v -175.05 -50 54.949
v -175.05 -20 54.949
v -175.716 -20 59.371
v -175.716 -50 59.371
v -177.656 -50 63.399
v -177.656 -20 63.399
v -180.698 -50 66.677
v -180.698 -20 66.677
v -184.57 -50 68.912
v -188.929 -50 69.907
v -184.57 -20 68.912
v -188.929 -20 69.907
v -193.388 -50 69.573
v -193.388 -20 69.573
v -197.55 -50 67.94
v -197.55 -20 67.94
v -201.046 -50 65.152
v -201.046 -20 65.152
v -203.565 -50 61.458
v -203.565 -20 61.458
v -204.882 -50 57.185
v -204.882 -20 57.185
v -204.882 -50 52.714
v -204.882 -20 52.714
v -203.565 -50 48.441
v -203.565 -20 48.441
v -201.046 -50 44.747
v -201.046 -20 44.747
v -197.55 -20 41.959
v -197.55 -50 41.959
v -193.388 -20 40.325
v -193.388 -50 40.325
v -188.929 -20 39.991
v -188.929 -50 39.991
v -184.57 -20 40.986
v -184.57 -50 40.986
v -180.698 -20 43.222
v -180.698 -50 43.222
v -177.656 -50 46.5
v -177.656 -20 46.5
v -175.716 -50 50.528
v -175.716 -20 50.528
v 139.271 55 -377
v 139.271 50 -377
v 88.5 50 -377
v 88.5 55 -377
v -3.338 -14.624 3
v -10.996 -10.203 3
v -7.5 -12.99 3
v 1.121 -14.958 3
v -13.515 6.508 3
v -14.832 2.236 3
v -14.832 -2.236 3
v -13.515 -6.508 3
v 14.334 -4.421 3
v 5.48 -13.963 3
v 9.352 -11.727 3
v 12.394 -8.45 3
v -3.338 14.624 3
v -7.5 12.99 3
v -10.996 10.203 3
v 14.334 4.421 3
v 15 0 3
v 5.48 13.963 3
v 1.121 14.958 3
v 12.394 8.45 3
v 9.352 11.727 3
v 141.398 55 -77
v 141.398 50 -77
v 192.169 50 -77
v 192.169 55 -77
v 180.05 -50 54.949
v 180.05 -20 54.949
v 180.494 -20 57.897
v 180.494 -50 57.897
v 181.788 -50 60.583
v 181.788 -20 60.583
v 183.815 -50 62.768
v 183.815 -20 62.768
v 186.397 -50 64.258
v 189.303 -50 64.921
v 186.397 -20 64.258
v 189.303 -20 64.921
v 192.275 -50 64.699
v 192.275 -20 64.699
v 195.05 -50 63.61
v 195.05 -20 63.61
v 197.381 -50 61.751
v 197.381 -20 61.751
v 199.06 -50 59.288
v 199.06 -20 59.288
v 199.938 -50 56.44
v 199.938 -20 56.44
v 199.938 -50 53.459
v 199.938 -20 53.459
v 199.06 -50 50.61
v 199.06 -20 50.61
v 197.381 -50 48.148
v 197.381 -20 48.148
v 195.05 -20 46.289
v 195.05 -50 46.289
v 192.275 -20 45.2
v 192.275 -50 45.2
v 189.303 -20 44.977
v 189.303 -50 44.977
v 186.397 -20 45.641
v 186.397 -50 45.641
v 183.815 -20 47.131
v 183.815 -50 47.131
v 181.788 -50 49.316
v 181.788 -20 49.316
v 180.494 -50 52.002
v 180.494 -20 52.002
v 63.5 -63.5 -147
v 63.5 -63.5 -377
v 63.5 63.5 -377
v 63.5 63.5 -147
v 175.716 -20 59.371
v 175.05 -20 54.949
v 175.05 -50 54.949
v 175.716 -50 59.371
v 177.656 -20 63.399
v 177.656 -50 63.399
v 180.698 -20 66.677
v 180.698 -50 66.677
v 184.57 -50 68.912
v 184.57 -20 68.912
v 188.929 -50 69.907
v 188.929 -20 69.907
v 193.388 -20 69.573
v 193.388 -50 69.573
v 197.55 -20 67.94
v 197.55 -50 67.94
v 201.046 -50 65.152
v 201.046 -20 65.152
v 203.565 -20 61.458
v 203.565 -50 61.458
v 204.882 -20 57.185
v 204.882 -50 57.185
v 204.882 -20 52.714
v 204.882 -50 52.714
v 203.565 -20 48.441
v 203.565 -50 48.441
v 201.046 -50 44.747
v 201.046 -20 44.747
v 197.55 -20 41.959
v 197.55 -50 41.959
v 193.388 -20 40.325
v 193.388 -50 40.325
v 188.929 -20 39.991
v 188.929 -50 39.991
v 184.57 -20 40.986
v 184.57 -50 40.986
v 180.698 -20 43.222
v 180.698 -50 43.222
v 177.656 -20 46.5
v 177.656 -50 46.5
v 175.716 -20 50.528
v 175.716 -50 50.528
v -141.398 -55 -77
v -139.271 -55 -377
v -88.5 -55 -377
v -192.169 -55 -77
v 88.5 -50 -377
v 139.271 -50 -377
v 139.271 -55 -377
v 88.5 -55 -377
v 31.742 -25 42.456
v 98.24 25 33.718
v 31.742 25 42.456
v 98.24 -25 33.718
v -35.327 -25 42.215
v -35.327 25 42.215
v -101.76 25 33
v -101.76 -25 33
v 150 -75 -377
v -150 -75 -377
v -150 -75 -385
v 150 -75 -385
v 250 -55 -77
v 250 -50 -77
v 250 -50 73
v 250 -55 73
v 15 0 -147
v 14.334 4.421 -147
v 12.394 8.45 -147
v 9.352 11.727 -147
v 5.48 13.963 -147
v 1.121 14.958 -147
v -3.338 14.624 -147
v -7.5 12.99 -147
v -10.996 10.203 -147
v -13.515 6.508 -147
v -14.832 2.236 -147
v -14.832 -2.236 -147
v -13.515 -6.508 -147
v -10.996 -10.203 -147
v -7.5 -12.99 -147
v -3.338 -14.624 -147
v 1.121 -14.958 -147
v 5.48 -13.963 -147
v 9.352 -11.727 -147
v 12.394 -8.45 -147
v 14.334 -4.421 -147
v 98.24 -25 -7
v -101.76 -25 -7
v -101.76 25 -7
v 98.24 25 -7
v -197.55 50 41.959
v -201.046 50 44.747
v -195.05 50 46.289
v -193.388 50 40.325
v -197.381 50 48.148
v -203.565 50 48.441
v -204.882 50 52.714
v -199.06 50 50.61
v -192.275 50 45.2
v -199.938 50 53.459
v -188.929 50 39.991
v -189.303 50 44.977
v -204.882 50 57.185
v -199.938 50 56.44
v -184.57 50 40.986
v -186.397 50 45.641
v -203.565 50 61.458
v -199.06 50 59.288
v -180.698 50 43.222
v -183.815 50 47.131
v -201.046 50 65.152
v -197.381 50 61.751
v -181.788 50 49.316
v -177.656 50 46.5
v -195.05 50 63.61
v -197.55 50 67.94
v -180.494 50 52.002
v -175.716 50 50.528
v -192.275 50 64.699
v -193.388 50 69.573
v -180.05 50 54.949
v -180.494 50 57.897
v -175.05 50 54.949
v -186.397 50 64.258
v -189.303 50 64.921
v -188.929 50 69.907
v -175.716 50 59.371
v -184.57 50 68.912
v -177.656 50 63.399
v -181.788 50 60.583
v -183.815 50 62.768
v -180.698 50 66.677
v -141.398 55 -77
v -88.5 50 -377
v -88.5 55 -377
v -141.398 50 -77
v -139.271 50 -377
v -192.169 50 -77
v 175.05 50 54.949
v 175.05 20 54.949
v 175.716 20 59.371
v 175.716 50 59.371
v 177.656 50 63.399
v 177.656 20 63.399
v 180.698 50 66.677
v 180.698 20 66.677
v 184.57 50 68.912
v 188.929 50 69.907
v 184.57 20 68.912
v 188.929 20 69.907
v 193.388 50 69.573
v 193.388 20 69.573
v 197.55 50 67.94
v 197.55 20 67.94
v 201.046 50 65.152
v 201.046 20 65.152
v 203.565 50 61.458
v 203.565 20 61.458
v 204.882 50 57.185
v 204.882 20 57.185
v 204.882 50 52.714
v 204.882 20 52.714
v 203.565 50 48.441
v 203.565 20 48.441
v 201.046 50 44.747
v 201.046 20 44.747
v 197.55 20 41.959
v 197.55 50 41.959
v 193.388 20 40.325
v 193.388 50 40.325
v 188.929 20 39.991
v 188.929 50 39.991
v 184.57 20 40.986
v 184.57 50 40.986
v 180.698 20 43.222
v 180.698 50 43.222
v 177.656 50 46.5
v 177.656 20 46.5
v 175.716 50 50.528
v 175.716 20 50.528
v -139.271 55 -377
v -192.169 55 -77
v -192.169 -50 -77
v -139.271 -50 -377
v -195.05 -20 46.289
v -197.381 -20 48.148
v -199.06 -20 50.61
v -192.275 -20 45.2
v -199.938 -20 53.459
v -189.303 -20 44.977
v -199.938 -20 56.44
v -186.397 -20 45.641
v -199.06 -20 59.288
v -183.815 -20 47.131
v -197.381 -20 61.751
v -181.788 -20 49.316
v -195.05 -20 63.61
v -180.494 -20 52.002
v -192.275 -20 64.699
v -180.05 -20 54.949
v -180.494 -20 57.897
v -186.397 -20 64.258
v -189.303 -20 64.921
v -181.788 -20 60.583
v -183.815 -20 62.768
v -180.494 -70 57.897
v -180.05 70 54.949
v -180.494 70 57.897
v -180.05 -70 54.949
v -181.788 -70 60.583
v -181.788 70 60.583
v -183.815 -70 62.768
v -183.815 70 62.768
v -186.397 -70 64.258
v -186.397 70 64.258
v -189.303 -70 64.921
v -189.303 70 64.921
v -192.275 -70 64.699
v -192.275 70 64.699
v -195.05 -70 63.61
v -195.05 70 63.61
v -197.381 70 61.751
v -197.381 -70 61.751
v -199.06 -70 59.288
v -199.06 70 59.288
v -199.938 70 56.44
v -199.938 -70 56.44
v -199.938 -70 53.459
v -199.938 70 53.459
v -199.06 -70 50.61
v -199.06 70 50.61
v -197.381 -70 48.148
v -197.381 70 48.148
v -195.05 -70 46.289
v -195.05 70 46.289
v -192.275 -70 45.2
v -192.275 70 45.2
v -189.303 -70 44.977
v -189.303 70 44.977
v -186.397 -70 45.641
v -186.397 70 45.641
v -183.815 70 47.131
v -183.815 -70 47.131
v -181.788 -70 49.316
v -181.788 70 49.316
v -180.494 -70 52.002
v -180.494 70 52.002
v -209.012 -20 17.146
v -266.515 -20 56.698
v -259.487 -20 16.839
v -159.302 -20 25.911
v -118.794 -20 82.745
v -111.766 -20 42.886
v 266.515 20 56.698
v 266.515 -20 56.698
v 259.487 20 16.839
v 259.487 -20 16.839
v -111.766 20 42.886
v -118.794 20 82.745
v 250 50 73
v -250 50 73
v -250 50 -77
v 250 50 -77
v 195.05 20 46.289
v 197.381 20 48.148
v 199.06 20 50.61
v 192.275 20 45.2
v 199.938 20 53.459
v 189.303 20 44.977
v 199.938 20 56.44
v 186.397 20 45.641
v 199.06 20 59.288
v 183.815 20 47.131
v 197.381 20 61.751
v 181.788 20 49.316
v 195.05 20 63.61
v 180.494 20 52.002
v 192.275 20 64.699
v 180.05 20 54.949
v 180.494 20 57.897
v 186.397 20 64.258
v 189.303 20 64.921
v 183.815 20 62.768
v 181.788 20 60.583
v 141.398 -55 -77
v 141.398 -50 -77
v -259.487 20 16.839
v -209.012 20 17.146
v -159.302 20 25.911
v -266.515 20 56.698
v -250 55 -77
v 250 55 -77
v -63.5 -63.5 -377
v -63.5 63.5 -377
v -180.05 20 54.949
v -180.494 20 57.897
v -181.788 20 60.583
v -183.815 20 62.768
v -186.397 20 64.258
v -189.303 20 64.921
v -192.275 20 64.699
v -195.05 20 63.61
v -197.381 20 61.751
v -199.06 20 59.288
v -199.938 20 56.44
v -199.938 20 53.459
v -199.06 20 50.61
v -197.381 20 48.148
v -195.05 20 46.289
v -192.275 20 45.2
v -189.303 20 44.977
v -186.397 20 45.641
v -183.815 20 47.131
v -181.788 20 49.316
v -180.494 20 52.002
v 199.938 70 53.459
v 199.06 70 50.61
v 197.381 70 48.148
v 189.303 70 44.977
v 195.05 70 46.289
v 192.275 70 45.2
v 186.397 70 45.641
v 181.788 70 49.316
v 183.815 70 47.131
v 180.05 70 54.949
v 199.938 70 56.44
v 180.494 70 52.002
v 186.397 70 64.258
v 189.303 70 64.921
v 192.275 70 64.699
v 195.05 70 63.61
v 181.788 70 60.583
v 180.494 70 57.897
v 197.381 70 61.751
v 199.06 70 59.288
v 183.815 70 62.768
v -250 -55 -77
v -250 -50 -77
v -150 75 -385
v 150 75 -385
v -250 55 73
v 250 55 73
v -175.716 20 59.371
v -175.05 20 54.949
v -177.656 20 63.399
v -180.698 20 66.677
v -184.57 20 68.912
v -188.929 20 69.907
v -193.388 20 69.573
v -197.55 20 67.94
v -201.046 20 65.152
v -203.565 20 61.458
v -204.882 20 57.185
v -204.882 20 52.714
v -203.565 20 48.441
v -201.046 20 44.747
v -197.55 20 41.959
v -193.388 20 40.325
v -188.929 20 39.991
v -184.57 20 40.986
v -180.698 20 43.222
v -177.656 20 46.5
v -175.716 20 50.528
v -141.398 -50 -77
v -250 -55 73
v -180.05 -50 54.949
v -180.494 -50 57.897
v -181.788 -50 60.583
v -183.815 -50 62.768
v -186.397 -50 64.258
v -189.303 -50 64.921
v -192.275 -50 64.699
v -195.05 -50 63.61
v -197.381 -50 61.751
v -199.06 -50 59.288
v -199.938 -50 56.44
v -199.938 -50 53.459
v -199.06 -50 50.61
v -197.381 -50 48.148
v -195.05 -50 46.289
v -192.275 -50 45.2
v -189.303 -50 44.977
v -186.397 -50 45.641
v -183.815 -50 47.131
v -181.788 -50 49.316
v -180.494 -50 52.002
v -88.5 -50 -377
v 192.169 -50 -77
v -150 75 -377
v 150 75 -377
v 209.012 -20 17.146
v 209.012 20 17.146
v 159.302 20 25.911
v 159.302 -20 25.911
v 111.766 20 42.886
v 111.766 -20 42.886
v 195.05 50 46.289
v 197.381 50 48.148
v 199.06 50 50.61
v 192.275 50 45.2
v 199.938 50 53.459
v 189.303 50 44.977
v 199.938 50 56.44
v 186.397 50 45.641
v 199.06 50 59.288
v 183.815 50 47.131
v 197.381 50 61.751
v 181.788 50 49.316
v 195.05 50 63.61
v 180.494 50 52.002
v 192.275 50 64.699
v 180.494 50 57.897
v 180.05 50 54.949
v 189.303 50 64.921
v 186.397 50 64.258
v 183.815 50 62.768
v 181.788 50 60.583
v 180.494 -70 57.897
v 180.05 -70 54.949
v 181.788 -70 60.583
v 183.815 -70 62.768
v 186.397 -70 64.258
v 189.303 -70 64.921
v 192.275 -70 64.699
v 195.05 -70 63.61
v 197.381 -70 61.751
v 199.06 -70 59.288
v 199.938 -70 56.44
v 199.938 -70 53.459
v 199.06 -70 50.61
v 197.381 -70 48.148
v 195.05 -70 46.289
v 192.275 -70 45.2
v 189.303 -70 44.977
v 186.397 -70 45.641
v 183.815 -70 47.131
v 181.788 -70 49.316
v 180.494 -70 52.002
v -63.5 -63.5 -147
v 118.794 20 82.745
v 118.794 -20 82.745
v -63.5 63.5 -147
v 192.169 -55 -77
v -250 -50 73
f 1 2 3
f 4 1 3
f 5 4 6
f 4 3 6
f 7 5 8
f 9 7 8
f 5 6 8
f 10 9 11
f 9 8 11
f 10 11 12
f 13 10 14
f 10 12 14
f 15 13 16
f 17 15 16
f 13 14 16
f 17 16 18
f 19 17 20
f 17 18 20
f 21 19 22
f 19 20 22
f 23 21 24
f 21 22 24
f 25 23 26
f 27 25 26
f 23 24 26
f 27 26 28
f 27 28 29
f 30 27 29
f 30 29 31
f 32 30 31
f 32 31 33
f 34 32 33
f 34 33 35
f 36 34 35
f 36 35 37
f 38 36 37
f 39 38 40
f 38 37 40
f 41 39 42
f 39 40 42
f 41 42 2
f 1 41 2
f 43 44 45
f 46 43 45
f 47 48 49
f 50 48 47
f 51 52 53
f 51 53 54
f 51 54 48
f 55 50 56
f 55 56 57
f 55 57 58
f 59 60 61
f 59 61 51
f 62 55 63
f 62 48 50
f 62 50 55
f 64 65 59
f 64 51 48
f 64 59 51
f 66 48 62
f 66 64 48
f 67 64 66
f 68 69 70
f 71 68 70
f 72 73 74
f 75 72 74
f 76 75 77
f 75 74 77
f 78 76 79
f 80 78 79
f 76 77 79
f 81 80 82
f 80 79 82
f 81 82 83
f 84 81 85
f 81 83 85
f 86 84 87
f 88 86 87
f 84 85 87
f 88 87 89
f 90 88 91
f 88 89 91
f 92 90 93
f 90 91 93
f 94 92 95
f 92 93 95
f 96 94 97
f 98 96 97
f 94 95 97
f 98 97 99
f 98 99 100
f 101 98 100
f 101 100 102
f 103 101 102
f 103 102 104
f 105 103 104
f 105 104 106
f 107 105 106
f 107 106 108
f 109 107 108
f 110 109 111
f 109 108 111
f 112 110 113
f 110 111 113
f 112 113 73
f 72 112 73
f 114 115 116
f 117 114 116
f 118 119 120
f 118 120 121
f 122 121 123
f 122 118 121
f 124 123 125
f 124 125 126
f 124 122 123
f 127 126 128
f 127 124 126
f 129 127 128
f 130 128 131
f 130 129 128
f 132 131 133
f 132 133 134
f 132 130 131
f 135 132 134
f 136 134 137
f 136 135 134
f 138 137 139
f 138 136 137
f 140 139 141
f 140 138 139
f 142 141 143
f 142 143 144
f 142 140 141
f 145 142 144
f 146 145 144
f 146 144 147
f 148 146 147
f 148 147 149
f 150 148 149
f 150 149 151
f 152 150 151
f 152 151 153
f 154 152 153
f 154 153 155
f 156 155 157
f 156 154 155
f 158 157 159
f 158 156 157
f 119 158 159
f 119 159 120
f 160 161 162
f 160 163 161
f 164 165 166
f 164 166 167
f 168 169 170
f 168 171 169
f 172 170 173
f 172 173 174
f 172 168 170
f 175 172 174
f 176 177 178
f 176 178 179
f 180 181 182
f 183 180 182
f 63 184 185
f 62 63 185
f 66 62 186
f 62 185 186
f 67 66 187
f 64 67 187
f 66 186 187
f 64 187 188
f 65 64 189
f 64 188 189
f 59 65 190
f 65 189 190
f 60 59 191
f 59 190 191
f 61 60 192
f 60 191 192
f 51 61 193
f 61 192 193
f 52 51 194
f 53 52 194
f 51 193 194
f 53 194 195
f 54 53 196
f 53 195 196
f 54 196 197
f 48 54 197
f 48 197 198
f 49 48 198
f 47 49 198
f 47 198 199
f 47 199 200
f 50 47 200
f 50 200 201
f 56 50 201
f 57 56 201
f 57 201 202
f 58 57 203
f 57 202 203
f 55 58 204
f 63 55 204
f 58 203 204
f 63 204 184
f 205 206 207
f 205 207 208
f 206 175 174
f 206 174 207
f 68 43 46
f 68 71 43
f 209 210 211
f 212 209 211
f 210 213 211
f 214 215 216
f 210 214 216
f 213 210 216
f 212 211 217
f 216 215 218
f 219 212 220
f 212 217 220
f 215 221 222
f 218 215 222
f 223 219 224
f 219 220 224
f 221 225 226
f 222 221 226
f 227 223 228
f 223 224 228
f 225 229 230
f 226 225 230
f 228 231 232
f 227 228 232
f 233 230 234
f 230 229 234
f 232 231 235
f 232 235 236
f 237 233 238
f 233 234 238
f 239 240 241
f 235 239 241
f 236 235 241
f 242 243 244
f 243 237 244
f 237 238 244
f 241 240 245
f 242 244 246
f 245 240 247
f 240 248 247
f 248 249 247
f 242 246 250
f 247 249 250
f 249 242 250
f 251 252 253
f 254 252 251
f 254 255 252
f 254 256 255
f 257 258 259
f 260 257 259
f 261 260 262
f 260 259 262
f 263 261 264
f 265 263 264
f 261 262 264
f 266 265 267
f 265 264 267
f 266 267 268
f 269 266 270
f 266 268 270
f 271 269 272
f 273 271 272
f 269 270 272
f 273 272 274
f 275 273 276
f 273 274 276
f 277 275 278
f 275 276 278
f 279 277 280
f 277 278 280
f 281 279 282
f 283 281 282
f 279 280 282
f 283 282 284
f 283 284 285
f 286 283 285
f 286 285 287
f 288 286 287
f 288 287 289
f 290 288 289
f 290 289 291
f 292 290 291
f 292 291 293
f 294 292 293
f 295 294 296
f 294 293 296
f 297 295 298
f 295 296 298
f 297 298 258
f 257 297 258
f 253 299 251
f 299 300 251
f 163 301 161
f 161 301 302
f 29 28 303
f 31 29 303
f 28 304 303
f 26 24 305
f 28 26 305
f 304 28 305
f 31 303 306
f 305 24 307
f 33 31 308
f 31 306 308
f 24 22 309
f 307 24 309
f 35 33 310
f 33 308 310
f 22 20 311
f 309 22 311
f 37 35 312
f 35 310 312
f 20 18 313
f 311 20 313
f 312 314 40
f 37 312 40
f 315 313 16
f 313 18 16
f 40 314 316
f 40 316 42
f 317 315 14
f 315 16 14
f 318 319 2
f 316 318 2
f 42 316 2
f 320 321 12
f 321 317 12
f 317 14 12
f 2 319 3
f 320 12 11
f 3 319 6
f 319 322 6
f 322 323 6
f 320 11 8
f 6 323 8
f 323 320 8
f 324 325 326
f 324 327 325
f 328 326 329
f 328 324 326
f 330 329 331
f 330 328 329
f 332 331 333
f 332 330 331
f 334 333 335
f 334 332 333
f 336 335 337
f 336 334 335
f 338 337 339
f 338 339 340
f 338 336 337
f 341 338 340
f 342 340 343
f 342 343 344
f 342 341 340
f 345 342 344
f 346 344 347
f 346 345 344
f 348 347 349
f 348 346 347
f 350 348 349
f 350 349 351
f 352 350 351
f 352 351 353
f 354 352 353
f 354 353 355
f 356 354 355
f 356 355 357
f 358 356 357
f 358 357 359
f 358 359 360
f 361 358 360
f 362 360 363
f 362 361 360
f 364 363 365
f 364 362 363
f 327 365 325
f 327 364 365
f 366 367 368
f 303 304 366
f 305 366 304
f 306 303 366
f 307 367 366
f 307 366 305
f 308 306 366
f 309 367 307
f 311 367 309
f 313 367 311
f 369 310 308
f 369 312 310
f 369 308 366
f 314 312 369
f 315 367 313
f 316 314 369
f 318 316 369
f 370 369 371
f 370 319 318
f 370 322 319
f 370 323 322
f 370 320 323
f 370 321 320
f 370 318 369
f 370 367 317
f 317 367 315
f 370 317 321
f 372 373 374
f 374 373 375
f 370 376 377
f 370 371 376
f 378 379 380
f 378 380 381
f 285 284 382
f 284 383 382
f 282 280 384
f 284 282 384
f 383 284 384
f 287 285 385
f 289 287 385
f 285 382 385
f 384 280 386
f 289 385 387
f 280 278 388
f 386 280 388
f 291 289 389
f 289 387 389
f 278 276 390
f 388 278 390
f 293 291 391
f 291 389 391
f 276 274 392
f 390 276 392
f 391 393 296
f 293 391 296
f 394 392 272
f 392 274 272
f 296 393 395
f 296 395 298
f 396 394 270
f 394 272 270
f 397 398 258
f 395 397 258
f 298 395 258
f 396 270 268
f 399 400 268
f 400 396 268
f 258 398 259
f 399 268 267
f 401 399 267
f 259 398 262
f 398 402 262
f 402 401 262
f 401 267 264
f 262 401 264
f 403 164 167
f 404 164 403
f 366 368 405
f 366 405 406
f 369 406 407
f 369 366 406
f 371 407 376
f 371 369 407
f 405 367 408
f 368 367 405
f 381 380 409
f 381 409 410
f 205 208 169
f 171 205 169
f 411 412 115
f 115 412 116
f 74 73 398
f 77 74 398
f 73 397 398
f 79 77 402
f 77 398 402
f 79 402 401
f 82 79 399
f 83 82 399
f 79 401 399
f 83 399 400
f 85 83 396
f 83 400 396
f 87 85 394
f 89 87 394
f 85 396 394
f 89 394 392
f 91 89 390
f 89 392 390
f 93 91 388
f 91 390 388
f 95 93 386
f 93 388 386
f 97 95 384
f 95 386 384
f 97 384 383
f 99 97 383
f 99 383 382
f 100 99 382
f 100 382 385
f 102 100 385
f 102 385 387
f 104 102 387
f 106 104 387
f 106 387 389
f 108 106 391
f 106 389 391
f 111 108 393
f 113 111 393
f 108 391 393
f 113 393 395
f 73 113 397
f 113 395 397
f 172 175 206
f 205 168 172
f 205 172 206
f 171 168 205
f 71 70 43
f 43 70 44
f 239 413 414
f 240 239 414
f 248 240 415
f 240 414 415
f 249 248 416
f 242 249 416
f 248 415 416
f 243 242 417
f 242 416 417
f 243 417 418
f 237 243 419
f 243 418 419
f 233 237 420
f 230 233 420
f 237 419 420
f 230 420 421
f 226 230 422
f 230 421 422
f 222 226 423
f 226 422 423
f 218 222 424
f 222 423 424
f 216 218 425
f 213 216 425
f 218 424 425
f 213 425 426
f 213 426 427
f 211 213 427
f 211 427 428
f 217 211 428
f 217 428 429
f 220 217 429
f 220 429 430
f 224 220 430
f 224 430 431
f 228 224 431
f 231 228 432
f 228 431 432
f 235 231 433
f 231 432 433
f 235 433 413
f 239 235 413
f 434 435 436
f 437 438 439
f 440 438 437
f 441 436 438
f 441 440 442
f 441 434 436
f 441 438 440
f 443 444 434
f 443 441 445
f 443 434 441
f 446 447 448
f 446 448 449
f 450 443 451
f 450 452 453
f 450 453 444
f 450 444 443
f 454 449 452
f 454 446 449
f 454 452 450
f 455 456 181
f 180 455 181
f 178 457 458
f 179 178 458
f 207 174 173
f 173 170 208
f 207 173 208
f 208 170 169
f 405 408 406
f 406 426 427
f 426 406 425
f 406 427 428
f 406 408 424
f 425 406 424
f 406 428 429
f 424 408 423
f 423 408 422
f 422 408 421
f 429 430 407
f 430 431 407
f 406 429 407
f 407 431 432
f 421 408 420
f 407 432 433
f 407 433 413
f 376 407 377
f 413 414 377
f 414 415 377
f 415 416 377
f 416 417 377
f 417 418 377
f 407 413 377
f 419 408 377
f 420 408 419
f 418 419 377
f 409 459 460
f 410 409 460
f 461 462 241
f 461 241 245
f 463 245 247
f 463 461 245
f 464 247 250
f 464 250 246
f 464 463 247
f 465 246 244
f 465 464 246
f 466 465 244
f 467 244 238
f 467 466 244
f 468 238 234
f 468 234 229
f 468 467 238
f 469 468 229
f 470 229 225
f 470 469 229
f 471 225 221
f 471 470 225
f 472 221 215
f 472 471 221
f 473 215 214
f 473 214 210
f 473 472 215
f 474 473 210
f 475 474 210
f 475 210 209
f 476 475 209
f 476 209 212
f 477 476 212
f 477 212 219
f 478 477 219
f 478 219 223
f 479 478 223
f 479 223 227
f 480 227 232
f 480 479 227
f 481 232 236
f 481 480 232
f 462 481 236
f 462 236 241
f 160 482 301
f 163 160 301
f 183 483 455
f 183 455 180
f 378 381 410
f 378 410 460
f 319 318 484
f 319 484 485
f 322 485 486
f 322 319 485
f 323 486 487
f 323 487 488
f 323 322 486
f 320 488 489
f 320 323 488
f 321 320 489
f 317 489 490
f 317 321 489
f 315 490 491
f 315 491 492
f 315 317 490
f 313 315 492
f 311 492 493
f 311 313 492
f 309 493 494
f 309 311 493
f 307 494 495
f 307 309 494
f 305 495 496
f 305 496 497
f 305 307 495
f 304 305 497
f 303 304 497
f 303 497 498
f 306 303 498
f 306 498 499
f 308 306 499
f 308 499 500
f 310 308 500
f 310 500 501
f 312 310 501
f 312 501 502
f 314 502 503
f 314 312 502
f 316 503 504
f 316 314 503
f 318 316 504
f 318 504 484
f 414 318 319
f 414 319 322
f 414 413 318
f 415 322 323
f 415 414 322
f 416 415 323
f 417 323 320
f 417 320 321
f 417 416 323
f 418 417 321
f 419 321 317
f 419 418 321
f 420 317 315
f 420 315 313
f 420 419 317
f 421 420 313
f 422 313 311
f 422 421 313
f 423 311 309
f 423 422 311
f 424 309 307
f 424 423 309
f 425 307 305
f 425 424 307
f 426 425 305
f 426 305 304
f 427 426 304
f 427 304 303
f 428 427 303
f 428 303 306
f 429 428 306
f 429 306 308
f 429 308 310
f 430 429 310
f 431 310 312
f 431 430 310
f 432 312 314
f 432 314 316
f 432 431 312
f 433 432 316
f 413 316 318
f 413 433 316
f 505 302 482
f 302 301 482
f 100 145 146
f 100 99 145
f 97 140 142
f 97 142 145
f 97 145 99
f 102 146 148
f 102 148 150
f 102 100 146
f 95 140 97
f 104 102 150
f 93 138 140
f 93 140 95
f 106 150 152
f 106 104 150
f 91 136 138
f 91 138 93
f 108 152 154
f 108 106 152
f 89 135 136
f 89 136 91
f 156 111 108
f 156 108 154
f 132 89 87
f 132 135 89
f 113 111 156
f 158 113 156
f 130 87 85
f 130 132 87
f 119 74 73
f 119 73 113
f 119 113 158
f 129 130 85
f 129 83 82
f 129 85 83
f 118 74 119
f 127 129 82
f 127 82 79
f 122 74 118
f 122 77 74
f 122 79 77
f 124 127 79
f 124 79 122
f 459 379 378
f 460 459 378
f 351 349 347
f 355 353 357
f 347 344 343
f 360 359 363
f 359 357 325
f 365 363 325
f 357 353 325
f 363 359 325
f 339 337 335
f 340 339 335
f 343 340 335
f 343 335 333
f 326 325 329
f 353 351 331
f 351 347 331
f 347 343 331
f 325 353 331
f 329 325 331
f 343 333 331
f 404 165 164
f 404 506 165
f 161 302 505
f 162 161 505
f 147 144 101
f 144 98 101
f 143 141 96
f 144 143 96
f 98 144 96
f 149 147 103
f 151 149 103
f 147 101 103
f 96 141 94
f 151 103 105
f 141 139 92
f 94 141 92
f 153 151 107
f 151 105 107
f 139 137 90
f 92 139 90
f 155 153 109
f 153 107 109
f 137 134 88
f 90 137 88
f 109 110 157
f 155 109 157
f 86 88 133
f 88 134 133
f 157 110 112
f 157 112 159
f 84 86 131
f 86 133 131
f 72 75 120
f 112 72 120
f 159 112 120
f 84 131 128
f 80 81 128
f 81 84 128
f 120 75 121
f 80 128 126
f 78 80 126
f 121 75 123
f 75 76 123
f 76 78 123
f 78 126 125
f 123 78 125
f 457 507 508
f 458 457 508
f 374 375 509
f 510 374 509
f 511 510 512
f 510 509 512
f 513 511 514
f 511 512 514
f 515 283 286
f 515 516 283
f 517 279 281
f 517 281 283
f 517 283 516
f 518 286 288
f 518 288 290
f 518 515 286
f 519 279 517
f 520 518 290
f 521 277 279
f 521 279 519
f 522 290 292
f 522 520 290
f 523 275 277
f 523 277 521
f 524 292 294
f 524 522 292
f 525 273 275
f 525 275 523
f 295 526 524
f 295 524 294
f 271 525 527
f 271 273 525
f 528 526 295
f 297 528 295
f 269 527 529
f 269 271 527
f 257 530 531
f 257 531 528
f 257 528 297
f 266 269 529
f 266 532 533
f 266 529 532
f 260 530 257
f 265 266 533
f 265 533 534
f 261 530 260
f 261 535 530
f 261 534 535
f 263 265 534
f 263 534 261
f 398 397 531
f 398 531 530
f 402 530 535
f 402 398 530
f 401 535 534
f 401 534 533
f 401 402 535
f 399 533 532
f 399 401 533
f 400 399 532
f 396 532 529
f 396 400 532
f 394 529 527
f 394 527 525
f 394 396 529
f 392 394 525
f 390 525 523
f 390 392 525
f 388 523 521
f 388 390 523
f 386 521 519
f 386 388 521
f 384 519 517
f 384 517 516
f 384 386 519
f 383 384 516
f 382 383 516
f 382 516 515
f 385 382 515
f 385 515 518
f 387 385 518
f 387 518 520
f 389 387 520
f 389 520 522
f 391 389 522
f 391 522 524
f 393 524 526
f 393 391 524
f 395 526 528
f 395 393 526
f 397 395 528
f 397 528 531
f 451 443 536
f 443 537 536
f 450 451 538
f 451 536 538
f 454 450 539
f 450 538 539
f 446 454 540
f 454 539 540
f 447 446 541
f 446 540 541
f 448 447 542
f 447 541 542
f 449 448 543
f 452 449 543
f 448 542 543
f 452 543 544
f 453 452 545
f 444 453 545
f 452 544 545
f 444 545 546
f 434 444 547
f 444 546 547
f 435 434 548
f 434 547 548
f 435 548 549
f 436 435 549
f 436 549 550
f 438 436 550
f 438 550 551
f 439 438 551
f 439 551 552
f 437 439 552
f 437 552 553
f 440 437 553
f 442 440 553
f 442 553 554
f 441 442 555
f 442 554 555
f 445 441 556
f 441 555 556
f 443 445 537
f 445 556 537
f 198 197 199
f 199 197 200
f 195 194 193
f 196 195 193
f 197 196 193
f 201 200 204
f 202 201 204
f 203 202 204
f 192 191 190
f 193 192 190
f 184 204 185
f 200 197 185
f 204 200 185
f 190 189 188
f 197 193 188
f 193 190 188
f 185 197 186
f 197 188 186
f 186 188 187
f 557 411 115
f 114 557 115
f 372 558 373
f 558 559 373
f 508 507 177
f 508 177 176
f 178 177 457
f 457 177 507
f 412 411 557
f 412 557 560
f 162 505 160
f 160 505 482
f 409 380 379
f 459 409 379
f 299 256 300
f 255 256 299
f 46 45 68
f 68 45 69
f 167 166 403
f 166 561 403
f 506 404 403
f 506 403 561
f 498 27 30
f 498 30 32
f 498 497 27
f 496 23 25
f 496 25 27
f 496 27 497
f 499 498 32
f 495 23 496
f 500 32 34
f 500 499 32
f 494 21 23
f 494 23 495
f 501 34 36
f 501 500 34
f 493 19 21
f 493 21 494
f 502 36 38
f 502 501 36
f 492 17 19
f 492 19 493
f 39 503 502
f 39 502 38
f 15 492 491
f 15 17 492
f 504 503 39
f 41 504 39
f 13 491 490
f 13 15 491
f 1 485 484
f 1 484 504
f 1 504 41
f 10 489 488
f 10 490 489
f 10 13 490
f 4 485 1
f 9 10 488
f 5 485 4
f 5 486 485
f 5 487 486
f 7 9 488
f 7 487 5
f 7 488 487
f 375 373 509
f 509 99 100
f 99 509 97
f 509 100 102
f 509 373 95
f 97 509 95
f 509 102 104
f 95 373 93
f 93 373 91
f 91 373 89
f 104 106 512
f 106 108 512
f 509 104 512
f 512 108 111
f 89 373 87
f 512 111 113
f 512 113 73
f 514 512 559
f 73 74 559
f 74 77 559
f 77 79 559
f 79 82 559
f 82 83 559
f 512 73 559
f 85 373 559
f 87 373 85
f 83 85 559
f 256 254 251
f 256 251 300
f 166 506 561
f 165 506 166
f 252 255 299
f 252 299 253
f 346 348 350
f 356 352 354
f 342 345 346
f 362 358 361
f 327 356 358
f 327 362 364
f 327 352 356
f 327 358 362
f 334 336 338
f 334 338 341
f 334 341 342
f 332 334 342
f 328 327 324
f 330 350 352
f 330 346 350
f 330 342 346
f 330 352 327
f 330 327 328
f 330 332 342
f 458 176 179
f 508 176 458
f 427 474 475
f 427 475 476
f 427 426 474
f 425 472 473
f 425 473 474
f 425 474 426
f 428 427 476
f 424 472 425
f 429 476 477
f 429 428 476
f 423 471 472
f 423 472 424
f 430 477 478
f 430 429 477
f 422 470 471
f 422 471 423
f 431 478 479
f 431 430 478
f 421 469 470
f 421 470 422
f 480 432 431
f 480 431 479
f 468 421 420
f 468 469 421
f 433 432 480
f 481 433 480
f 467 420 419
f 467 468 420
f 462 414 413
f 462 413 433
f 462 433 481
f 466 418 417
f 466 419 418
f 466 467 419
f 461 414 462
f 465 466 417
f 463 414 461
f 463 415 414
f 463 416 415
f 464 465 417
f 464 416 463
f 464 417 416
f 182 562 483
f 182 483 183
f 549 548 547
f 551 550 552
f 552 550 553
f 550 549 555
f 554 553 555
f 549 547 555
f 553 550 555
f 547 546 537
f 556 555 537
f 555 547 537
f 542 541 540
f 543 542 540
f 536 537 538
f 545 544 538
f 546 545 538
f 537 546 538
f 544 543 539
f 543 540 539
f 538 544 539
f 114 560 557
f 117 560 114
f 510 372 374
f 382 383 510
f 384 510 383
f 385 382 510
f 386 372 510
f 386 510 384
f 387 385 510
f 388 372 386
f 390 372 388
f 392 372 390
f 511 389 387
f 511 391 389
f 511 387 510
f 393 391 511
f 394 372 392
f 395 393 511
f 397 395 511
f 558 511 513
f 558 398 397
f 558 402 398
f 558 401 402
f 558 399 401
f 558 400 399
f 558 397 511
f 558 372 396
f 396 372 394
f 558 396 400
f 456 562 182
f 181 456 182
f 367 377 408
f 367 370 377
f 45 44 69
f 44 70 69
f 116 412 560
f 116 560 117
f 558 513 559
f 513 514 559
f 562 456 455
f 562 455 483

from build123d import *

# Parameters (mm, degrees)
F1_W           = 127
F1_H           = 127
F2_DEPTH       = 230
F3_R           = 15
F4_DEPTH       = 150
F5_W           = 300
F5_H           = 150
F6_DEPTH       = 8
F8_DEPTH       = 25
F11_DEPTH      = 5
F14_W          = 500
F14_H          = 150
F15_DEPTH      = 5
F17_R          = 10
F18_DEPTH      = 20
F19_R          = 15
F19_R_2        = 10
F20_DEPTH      = 30
F22_R          = 10
F23_DEPTH      = 15
F23_DEPTH_BACK = 125


with BuildPart() as f2:
    # F1 (on offset) → F2 (new body)
    with BuildSketch(Plane.XY.offset(-377)):
        Rectangle(F1_W, F1_H)
    extrude(amount=F2_DEPTH)


with BuildPart() as f4:
    # F3 (on face) → F4 (new body)
    with BuildSketch(Plane.XY.offset(-147)):
        Circle(F3_R)
    extrude(amount=F4_DEPTH)


with BuildPart() as f6:
    # F5 (on offset) → F6 (new body)
    with BuildSketch(Plane.XY.offset(-377)):
        Rectangle(F5_W, F5_H)
    extrude(amount=-F6_DEPTH)


with BuildPart() as f8:
    # F7 (on Front) → F8 (new body, symmetric)
    with BuildSketch(Plane.XZ):
        with BuildLine():
            ThreePointArc((98.240208, 33.718437), (-1.796081, 43.461336), (-101.759792, 33))
            Line((-101.759792, 33), (-101.759792, -7))
            Line((-101.759792, -7), (98.240208, -7))
            Line((98.240208, -7), (98.240208, 33.718437))
        make_face()
    extrude(amount=F8_DEPTH, both=True)


with BuildPart() as f11:
    # F10 (on offset) → F11 (new body)
    with BuildSketch(Plane.XZ.offset(50)):
        Polygon((-139.271331, -377), (-88.5, -377), (-141.398094, -77), (-192.169425, -77), align=None)
    extrude(amount=F11_DEPTH)


with BuildPart() as f12_1:
    # F12: instance of F11
    add(f11.part.mirror(Plane.XZ))


with BuildPart() as f13_1:
    # F13: instance of F12_1
    add(f12_1.part.mirror(Plane.YZ))


with BuildPart() as f13_2:
    # F13: instance of F11
    add(f11.part.mirror(Plane.YZ))


with BuildPart() as f15:
    # F14 (on offset) → F15 (new body)
    with BuildSketch(Plane.XZ.offset(50)):
        with Locations((0, -2)):
            Rectangle(F14_W, F14_H)
    extrude(amount=F15_DEPTH)


with BuildPart() as f16_1:
    # F16: instance of F15
    add(f15.part.mirror(Plane.XZ))


with BuildPart() as f18:
    # F17 (on Front) → F18 (new body, symmetric)
    with BuildSketch(Plane.XZ):
        with BuildLine():
            Line((-118.794124, 82.745038), (-266.515287, 56.697811))
            Line((-266.515287, 56.697811), (-259.487094, 16.838947))
            ThreePointArc((-259.487094, 16.838947), (-183.972296, 20.481037), (-111.765931, 42.886174))
            Line((-111.765931, 42.886174), (-118.794124, 82.745038))
        make_face()
        with Locations((-190.049983, 54.949308)):
            Circle(F17_R, mode=Mode.SUBTRACT)
    extrude(amount=F18_DEPTH, both=True)


with BuildPart() as f20:
    # F19 (on face) → F20 (new body, through all)
    with BuildSketch(Plane.XZ.offset(20)):
        with Locations((-190.049983, 54.949308)):
            Circle(F19_R)
        with Locations((-190.049983, 54.949308)):
            Circle(F19_R_2, mode=Mode.SUBTRACT)
    extrude(amount=F20_DEPTH)


with BuildPart() as f21_1:
    # F21: instance of F20
    add(f20.part.mirror(Plane.XZ))


with BuildPart() as f23:
    # F22 (on face) → F23 (new body, two sides)
    with BuildSketch(Plane.XZ.offset(55)) as f23_sk:
        with Locations((-190.049983, 54.949308)):
            Circle(F22_R)
    extrude(amount=F23_DEPTH)
    extrude(f23_sk.sketch, amount=-F23_DEPTH_BACK)


with BuildPart() as f24_1:
    # F24: instance of F23
    add(f23.part.mirror(Plane.YZ))


with BuildPart() as f24_2:
    # F24: instance of F20
    add(f20.part.mirror(Plane.YZ))


with BuildPart() as f24_3:
    # F24: instance of F21_1
    add(f21_1.part.mirror(Plane.YZ))


with BuildPart() as f24_4:
    # F24: instance of F18
    add(f18.part.mirror(Plane.YZ))


solid = Compound([f2.part, f4.part, f6.part, f8.part, f11.part, f12_1.part, f13_1.part, f13_2.part, f15.part, f16_1.part, f18.part, f20.part, f21_1.part, f23.part, f24_1.part, f24_2.part, f24_3.part, f24_4.part])
